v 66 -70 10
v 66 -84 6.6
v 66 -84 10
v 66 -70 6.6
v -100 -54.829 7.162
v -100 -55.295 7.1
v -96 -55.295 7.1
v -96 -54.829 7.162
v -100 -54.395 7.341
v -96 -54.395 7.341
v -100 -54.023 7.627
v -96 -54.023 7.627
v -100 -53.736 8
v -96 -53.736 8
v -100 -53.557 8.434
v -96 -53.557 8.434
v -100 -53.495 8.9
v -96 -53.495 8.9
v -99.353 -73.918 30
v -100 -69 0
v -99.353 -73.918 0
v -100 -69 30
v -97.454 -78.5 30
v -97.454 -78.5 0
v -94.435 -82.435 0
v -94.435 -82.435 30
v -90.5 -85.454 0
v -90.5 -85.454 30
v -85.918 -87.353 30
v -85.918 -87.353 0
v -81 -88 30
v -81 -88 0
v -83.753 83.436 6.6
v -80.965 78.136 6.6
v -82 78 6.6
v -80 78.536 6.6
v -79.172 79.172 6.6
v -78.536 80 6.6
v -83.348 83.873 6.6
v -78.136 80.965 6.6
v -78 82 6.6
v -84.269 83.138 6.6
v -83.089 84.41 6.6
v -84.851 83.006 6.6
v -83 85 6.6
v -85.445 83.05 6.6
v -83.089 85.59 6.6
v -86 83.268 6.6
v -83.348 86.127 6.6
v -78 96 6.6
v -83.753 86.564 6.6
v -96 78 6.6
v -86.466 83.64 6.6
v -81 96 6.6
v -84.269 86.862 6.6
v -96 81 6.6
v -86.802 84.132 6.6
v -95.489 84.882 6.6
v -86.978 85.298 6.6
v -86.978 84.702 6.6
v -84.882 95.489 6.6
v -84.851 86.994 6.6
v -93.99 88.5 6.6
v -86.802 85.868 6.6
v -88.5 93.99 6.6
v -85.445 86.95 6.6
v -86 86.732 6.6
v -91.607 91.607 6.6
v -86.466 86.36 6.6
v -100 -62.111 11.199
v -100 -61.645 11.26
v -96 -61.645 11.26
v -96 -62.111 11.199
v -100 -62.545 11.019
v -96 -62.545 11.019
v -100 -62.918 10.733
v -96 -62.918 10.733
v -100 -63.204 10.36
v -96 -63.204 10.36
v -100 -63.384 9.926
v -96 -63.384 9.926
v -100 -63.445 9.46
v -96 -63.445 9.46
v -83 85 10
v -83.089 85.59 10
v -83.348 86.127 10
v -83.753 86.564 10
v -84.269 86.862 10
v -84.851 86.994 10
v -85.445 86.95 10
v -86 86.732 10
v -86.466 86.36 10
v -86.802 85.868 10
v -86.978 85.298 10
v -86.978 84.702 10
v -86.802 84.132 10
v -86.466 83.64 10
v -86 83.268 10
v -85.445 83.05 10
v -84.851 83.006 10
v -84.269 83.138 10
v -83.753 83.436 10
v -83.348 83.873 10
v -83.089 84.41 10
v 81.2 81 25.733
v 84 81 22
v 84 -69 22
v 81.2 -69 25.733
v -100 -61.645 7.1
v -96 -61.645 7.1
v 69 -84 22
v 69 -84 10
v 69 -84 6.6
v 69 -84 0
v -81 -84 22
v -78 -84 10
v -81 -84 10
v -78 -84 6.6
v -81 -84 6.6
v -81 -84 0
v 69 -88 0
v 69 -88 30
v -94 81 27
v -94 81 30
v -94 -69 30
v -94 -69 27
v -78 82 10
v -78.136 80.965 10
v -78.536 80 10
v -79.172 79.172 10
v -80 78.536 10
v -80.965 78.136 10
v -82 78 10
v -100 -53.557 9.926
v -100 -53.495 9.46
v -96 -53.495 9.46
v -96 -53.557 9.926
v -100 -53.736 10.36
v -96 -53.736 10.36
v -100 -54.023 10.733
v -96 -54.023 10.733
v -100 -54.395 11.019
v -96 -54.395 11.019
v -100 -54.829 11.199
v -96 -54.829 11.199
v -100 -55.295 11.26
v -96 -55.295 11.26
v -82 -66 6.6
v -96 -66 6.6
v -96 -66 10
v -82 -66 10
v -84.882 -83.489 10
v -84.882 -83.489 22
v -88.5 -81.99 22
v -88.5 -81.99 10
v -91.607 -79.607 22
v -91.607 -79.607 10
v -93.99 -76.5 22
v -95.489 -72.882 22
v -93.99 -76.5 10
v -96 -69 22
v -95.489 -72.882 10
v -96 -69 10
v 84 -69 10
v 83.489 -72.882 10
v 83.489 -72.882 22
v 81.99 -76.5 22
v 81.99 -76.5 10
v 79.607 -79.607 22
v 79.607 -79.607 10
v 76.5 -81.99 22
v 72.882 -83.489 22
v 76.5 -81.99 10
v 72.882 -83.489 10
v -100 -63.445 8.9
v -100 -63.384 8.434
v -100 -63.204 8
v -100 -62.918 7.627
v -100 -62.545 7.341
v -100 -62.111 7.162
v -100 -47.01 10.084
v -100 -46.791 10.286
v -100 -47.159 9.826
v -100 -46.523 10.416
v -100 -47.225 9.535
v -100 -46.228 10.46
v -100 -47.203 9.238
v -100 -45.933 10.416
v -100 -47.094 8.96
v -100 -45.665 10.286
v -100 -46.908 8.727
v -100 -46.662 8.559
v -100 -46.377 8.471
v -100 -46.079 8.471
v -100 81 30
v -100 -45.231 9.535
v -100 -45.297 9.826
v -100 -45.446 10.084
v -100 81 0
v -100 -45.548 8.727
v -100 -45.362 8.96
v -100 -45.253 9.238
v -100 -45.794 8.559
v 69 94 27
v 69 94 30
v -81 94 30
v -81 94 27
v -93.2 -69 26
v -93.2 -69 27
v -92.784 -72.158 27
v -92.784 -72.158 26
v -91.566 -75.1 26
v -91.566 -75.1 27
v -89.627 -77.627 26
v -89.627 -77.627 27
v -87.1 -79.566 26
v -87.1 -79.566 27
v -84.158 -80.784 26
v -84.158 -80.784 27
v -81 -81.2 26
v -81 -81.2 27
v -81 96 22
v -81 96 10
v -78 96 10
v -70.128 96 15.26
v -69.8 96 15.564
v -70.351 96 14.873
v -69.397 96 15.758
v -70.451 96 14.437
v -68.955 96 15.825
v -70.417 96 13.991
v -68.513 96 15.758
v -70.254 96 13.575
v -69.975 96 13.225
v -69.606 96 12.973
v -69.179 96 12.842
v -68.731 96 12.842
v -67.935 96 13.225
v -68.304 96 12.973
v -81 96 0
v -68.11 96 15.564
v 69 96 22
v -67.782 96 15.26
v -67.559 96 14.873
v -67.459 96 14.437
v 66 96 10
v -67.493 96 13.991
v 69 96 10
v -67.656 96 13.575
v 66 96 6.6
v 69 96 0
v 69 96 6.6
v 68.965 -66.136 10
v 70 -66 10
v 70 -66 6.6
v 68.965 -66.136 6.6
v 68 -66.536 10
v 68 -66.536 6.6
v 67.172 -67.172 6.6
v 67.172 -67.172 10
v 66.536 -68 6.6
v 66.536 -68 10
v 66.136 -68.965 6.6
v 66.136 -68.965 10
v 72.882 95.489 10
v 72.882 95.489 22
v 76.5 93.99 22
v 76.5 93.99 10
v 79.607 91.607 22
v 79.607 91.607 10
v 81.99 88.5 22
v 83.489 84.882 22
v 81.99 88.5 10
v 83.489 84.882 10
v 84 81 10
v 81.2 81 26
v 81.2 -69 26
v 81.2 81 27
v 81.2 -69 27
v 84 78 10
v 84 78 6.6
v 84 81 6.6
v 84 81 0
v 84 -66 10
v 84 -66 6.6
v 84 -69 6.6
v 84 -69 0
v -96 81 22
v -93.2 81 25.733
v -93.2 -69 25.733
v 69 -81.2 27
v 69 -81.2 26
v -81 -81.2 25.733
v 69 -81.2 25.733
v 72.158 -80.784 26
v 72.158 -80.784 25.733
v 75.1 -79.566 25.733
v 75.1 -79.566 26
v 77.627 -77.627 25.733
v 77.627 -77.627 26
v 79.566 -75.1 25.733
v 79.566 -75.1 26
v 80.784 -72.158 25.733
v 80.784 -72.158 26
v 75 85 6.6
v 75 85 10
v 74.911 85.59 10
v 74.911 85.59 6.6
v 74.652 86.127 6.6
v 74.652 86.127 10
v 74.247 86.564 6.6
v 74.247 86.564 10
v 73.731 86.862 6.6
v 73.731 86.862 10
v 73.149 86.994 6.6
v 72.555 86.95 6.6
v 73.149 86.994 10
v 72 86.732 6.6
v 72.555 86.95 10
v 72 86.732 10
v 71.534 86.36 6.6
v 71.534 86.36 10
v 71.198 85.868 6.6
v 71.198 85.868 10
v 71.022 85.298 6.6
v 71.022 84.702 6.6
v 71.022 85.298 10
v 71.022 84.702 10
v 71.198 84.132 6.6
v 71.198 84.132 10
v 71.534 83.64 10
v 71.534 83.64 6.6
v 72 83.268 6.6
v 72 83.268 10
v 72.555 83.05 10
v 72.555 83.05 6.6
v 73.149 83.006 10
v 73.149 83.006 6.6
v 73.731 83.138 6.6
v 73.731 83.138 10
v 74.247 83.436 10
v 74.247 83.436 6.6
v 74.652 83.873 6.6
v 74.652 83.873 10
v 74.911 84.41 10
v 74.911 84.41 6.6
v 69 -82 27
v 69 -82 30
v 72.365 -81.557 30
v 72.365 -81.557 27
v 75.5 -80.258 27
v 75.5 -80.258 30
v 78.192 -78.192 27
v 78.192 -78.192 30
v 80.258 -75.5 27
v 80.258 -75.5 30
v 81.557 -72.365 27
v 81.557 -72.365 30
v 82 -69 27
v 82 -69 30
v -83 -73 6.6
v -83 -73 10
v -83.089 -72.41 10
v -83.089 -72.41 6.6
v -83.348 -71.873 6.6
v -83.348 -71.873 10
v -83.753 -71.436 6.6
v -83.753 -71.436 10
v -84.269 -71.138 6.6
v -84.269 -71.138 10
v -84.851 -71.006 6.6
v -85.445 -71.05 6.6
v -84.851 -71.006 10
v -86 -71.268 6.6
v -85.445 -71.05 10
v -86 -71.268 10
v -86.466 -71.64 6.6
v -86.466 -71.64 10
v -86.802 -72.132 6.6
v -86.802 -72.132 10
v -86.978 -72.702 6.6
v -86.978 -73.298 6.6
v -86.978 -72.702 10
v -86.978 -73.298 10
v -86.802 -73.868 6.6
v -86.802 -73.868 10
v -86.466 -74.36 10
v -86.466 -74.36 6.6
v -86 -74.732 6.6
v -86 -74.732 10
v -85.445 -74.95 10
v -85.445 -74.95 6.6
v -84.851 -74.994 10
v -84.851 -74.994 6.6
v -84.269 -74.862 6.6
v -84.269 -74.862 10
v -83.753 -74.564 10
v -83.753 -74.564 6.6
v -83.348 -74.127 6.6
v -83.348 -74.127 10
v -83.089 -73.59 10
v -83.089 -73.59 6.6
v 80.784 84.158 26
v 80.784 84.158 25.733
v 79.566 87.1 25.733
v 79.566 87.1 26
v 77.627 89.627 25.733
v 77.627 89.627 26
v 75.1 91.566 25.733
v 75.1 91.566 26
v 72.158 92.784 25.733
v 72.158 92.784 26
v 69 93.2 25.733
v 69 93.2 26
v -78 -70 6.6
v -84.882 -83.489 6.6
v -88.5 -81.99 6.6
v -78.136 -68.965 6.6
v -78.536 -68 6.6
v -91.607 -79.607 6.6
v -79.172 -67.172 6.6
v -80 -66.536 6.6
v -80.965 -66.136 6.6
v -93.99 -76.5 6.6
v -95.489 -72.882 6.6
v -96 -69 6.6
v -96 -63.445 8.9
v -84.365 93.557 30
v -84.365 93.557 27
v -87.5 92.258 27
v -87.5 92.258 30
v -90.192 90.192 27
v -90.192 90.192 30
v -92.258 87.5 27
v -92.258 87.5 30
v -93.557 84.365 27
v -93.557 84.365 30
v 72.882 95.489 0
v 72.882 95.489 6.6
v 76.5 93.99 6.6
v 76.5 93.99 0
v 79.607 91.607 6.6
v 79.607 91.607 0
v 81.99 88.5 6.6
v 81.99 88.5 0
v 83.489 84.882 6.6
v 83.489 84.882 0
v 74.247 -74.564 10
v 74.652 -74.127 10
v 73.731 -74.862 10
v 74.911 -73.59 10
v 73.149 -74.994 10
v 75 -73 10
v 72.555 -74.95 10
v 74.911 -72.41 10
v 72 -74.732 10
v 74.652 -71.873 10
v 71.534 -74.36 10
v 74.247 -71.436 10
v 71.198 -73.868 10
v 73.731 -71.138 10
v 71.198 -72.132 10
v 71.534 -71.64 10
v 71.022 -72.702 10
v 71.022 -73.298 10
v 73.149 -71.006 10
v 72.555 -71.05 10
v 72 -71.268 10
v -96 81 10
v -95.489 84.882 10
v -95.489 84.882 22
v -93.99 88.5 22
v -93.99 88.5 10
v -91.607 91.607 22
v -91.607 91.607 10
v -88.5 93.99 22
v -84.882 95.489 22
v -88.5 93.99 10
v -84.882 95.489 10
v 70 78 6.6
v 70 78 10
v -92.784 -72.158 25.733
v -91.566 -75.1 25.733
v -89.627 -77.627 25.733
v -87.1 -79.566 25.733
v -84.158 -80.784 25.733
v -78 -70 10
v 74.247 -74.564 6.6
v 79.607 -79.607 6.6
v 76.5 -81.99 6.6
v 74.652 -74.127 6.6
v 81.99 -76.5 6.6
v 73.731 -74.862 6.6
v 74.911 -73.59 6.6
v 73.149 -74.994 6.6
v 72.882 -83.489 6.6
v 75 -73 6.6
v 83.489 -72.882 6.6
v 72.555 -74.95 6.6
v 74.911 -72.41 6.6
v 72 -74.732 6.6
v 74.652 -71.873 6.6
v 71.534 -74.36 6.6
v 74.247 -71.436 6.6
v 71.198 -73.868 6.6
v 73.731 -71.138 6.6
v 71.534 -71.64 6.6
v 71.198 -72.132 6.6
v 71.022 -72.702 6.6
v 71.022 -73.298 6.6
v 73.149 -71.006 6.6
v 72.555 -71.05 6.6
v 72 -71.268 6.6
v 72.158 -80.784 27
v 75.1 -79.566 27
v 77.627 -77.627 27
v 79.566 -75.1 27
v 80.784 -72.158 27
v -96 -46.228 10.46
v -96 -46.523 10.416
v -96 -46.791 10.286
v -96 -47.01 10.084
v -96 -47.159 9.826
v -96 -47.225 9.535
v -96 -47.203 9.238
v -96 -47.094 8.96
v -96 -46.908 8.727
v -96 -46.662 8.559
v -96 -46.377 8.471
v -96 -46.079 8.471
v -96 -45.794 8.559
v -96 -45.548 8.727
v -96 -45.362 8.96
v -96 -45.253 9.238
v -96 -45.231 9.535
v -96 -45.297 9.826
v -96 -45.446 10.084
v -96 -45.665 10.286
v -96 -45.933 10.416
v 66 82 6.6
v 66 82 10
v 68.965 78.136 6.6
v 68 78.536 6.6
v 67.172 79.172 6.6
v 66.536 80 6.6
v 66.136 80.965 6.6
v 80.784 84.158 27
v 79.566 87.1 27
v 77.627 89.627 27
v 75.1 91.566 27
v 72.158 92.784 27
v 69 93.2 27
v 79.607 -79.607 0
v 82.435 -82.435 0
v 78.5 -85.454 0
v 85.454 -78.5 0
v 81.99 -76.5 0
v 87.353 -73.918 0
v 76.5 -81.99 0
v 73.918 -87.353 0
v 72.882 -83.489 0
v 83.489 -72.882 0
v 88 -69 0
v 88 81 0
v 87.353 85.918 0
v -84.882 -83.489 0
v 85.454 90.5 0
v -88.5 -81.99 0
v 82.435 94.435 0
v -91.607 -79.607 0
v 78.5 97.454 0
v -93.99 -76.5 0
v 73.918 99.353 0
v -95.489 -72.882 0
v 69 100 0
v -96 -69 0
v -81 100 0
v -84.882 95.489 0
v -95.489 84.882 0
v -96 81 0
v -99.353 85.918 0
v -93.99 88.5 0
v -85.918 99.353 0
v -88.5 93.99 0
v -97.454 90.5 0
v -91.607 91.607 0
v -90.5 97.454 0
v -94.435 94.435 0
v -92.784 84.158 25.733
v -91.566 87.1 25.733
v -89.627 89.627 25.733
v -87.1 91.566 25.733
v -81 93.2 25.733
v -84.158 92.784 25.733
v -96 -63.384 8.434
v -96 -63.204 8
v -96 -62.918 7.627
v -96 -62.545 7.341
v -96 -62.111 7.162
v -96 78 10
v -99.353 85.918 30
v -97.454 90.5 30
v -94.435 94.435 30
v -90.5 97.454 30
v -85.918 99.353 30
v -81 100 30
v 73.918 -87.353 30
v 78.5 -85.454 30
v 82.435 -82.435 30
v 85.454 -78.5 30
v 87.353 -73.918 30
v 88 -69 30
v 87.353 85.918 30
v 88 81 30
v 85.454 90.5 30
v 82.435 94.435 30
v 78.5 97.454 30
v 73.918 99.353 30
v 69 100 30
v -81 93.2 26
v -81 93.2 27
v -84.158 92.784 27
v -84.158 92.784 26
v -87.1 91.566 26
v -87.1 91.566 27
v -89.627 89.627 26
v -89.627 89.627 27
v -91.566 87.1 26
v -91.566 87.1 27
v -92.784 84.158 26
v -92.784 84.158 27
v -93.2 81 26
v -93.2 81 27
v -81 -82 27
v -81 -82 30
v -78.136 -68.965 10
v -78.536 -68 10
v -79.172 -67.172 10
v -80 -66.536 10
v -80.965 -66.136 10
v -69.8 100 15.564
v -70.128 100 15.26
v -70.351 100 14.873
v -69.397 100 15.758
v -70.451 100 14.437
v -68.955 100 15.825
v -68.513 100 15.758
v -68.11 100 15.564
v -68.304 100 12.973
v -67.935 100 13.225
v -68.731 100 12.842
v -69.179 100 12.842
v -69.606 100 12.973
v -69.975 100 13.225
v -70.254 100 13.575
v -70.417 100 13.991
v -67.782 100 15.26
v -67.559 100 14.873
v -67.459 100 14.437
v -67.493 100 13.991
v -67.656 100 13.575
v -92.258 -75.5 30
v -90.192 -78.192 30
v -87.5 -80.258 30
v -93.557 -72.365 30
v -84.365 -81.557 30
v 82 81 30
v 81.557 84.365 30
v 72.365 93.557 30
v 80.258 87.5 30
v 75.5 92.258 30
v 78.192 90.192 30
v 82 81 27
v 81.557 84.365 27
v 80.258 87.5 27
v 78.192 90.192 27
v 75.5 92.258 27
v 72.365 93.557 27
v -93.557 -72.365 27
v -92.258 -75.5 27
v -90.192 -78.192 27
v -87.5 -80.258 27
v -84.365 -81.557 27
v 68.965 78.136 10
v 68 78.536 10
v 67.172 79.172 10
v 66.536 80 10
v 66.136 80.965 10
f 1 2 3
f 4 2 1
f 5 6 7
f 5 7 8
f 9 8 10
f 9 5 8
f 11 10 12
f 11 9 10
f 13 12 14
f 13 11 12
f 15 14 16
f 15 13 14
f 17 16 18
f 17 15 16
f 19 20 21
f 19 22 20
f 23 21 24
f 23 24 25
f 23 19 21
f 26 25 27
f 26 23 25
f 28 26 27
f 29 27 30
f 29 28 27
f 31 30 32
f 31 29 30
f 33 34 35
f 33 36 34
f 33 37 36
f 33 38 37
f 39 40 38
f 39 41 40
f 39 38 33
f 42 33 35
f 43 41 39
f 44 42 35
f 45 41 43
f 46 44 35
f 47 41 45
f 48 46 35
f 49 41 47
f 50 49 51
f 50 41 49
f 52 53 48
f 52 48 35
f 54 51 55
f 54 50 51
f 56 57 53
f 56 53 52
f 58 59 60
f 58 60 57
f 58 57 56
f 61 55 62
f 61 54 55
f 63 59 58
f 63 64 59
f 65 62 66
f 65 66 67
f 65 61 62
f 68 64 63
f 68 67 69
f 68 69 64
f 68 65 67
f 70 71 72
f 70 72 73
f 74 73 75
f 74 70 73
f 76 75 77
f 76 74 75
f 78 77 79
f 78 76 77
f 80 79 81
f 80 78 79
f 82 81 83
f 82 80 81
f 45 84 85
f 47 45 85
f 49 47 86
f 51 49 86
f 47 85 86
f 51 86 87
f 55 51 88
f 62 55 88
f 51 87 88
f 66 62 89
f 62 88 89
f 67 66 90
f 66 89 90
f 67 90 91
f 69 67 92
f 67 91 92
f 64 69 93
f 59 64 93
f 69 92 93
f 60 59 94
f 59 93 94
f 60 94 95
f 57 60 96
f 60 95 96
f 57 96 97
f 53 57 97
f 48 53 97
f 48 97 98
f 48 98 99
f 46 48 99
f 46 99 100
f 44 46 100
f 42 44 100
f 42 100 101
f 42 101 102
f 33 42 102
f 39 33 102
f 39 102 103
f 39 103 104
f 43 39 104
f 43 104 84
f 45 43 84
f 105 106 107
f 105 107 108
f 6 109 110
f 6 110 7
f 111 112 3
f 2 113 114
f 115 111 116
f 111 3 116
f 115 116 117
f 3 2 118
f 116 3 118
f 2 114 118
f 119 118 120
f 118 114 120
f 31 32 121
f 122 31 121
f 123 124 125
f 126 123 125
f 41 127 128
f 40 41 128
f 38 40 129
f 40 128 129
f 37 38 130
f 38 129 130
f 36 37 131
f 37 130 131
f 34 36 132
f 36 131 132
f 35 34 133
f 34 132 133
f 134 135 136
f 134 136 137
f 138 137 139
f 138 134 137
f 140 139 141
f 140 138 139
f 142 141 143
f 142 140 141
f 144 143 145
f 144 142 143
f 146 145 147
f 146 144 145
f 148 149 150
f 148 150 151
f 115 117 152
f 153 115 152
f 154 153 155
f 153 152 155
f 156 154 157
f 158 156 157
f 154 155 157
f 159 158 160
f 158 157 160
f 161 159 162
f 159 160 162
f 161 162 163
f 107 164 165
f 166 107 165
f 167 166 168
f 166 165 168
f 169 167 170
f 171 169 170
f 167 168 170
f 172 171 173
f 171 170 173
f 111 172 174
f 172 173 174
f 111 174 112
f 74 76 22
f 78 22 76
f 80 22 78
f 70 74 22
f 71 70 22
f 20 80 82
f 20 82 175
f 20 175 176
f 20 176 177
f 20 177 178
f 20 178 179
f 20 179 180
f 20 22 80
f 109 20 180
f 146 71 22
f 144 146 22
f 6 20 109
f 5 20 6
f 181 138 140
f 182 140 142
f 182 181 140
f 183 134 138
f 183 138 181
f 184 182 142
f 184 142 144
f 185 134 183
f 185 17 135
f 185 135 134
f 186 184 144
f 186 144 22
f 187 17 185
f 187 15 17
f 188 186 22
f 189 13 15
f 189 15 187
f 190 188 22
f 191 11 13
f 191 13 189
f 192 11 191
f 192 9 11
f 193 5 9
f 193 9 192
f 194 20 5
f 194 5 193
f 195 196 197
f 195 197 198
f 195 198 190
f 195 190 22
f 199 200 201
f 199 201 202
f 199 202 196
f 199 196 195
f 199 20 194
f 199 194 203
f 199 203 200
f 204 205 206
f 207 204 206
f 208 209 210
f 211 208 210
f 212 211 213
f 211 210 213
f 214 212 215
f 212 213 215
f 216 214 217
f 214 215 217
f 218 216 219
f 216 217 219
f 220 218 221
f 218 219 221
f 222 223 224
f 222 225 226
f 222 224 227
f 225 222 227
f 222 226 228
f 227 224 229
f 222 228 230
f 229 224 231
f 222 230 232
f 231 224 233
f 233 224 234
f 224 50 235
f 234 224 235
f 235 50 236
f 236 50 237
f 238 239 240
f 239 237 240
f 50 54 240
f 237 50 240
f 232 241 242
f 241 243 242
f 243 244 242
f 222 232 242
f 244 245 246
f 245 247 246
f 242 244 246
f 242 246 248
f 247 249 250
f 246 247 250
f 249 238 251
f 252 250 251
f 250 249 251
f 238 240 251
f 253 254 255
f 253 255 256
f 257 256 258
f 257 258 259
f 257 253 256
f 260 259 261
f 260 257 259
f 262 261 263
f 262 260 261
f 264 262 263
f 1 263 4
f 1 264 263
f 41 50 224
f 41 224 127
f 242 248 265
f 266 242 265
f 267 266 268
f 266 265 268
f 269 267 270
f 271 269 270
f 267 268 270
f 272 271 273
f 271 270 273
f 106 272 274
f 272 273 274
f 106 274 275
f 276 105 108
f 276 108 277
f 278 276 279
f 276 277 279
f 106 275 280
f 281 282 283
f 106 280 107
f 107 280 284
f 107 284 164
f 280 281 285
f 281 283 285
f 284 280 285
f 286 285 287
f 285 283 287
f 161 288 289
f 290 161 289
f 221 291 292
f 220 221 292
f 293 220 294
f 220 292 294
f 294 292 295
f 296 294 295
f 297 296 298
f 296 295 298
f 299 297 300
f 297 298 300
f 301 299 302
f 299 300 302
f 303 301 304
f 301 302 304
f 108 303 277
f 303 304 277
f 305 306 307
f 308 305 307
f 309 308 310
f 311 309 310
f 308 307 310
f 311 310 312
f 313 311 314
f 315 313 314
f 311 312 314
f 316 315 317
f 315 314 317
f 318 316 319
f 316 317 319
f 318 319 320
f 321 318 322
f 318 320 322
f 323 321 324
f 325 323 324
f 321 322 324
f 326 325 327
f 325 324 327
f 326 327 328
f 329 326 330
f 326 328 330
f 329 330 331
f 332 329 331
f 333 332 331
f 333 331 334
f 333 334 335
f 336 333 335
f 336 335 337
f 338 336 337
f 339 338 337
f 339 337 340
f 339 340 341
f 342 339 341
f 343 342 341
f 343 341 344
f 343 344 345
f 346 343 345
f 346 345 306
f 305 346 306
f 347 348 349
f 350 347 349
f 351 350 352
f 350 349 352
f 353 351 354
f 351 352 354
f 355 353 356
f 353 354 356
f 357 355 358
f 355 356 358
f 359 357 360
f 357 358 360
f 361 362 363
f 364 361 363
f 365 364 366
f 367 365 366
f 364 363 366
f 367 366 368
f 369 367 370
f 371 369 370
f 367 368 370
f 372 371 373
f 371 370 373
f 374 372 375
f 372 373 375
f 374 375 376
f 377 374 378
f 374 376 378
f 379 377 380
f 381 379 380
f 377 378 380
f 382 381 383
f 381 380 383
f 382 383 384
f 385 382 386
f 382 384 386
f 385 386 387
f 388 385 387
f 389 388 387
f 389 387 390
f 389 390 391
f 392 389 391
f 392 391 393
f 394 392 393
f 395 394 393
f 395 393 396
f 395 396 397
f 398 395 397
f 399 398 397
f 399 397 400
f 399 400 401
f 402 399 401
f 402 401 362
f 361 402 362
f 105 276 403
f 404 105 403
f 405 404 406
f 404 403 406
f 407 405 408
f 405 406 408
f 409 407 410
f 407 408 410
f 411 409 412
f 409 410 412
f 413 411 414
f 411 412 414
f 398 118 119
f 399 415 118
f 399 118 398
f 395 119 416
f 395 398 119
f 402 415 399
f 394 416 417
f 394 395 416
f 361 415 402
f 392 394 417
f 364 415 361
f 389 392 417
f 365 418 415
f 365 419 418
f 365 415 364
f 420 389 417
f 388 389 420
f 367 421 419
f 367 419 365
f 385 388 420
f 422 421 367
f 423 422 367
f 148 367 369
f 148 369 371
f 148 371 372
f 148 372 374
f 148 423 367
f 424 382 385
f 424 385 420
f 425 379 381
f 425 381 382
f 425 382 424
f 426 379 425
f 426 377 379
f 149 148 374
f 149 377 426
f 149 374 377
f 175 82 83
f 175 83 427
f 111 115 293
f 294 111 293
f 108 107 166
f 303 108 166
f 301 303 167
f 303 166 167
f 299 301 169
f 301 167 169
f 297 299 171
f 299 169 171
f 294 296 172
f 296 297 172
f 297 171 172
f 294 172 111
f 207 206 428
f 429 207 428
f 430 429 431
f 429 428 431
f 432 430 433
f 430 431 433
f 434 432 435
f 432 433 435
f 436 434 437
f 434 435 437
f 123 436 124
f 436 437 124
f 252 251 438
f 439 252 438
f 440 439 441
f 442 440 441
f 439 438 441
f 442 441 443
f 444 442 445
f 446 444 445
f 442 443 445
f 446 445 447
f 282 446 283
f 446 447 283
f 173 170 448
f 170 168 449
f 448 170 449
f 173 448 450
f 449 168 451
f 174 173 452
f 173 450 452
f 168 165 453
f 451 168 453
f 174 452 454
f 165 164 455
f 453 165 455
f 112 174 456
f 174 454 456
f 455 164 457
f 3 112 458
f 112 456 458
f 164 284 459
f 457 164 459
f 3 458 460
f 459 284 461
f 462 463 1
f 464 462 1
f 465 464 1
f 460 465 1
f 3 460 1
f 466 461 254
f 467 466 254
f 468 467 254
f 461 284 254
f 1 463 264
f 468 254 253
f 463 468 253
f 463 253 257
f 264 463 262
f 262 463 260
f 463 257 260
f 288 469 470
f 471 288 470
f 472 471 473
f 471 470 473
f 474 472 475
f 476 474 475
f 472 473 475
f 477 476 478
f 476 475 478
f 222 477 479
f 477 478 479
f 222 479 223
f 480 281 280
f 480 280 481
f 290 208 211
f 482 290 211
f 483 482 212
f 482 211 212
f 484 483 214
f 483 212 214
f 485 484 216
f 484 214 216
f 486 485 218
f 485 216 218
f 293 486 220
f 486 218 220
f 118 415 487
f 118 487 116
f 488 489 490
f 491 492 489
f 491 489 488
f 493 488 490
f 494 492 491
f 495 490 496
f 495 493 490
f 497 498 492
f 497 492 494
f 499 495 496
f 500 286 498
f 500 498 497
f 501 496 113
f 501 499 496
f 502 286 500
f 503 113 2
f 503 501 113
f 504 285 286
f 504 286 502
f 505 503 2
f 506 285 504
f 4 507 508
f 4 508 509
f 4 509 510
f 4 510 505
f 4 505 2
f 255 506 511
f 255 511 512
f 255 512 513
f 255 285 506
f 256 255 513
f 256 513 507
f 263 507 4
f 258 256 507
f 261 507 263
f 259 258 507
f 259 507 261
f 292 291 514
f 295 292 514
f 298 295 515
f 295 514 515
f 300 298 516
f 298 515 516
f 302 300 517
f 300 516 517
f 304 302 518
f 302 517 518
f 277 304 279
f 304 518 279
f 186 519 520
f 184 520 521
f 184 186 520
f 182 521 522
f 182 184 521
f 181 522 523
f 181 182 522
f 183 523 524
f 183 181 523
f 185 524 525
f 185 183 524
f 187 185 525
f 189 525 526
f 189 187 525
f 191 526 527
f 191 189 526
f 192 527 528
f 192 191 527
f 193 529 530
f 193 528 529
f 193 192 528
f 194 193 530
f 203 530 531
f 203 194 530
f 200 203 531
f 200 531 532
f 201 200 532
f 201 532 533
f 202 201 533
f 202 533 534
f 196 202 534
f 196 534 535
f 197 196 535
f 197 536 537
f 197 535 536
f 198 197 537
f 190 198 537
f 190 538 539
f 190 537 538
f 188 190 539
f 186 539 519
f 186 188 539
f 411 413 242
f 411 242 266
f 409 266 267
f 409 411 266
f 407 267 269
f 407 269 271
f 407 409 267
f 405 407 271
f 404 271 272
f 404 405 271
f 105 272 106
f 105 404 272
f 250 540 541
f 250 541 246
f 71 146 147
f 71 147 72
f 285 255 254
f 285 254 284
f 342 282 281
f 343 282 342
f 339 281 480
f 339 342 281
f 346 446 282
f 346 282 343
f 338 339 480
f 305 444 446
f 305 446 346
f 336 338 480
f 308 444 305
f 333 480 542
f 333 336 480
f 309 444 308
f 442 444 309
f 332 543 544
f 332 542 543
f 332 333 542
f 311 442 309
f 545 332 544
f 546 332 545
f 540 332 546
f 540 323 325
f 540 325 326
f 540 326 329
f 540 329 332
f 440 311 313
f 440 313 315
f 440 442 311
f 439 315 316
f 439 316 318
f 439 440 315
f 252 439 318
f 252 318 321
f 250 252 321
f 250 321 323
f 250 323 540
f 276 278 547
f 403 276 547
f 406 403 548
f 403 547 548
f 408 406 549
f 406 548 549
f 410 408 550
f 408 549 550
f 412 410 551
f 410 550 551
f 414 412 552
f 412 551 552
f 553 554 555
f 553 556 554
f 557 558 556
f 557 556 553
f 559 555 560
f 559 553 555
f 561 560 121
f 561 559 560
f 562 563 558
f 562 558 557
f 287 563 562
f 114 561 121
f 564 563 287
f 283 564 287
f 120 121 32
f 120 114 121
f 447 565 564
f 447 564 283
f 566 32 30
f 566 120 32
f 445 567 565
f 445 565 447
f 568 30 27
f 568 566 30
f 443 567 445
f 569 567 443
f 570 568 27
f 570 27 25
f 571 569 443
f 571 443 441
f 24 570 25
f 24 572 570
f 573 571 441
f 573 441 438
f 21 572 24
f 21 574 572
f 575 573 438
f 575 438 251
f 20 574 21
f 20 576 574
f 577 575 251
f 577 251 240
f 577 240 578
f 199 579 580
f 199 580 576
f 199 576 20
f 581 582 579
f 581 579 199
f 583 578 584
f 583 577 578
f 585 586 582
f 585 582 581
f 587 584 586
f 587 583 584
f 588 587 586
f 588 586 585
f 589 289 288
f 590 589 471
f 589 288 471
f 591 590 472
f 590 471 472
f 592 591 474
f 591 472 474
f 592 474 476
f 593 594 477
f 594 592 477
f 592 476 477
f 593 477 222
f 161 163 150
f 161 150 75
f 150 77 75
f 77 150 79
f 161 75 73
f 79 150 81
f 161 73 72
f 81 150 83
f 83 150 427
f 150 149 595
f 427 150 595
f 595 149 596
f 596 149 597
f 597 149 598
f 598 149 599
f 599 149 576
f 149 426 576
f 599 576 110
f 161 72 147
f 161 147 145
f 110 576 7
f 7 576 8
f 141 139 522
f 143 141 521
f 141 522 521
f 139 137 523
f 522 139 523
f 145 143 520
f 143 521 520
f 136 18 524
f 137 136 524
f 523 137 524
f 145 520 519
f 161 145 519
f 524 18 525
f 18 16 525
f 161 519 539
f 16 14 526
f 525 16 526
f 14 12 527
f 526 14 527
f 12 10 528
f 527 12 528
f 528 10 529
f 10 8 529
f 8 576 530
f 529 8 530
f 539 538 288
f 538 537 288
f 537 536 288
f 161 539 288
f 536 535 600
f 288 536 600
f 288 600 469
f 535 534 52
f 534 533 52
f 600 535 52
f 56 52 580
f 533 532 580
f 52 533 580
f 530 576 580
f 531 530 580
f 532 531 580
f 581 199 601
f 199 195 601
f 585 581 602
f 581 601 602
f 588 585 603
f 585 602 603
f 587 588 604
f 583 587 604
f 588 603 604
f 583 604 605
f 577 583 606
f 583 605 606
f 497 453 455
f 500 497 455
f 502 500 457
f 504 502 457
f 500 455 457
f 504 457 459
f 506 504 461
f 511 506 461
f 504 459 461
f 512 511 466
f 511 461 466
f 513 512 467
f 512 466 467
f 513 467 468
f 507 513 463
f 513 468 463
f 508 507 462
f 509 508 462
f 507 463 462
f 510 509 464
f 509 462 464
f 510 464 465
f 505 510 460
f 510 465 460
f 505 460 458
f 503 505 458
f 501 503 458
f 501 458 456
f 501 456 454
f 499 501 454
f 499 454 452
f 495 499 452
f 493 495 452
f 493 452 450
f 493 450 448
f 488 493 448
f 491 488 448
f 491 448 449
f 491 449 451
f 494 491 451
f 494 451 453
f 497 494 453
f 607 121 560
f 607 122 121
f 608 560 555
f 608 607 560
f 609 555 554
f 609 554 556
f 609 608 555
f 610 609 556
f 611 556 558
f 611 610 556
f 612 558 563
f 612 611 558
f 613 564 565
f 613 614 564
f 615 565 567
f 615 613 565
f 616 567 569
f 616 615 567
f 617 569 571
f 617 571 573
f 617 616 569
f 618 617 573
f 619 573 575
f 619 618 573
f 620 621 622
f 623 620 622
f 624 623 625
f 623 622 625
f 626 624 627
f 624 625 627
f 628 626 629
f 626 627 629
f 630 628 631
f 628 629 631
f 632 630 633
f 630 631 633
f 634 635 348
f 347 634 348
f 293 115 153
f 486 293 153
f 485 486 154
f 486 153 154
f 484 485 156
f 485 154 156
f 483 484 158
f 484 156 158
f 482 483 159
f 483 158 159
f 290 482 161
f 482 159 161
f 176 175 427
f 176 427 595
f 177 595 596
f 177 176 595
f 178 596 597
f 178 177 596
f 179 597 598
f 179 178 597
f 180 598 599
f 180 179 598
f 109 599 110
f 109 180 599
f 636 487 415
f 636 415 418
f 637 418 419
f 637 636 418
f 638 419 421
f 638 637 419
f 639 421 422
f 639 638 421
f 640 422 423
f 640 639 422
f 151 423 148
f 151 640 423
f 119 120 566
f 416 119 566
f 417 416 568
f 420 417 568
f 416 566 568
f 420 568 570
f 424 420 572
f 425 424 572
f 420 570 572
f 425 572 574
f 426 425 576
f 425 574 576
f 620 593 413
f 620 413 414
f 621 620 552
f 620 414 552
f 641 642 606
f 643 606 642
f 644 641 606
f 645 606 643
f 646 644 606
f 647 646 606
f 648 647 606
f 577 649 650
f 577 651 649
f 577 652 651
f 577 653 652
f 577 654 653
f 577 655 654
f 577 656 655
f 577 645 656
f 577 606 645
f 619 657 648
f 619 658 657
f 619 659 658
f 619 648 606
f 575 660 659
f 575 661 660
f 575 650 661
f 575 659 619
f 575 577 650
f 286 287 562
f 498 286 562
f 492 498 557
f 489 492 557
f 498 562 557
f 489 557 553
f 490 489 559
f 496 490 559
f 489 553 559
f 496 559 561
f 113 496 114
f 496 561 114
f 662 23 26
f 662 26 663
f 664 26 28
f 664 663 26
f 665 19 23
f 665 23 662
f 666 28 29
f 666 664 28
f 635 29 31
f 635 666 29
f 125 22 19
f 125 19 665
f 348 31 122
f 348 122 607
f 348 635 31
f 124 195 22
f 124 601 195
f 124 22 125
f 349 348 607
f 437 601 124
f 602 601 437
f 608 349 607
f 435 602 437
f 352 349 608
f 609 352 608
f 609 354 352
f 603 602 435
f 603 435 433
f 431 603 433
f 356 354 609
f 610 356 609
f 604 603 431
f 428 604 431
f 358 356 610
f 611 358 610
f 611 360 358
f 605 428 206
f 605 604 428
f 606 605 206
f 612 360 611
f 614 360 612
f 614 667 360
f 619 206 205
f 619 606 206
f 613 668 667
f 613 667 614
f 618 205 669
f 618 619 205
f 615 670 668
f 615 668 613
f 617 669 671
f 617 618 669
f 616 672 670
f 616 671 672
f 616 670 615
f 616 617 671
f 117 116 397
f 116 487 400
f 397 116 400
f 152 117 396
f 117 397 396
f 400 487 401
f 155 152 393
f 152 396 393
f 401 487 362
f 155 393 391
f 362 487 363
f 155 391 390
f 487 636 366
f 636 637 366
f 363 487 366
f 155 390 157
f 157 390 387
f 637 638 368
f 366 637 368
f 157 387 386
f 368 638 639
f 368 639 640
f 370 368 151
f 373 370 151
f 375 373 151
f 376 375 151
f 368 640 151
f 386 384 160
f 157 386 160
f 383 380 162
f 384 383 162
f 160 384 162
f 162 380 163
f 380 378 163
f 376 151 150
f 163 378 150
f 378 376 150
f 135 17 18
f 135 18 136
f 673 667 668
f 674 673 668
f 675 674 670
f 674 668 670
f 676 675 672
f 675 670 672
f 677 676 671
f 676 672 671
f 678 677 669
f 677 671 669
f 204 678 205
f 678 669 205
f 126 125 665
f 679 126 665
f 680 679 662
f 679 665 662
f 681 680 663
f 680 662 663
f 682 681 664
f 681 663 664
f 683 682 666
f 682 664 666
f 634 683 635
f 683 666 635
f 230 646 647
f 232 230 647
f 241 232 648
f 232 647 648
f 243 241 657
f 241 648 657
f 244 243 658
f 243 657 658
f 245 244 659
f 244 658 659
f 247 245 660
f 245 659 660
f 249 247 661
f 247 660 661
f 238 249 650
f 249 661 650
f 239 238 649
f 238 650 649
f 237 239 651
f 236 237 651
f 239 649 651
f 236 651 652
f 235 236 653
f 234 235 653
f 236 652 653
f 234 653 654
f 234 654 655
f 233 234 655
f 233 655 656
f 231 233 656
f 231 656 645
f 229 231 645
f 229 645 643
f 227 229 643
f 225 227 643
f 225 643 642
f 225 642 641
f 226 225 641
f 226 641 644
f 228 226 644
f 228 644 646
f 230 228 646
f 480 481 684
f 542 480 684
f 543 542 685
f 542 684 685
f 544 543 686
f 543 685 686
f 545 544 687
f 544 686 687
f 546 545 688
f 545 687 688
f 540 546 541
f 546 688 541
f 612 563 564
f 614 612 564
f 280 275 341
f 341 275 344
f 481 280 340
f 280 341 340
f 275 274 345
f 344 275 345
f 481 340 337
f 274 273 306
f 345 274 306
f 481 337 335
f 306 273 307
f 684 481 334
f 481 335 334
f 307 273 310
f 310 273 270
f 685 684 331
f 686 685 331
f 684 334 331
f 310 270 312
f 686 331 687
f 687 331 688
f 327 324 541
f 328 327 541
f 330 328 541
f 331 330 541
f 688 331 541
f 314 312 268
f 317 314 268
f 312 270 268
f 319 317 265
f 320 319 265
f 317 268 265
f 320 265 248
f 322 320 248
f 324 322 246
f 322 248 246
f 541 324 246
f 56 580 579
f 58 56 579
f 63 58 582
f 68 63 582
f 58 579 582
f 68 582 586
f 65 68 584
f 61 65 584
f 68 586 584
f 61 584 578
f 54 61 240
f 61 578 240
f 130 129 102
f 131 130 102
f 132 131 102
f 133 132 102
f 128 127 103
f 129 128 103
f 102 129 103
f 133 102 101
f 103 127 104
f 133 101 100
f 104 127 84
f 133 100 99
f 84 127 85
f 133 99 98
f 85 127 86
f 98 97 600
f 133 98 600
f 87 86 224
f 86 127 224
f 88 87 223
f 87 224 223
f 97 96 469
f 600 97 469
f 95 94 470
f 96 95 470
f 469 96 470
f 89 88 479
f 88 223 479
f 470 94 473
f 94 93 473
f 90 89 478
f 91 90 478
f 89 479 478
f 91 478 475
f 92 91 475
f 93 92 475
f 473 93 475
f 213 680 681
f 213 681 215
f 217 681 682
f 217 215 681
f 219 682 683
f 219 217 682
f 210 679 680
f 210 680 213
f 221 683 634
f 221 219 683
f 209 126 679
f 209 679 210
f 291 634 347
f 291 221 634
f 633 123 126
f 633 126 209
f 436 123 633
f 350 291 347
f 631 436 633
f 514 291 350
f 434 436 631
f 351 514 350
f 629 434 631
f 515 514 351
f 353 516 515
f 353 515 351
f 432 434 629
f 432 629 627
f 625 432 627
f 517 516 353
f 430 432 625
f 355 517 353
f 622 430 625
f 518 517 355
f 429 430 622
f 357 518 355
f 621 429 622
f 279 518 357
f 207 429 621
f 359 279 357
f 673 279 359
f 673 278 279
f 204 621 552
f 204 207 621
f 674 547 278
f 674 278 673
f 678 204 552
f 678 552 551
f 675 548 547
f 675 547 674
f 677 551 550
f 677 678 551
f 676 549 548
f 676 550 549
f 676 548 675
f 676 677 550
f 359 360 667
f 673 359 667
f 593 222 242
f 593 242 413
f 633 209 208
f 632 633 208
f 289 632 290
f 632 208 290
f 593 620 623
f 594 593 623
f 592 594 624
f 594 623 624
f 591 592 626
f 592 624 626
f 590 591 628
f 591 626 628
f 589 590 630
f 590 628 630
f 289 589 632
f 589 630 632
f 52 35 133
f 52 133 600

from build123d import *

# Parameters (mm, degrees)
SKETCH2_W                                 = 188
SKETCH2_H                                 = 188
BOSS_EXTRUDE1_DEPTH                       = 30
FILLET1_R                                 = 19
CUT_EXTRUDE6_DEPTH                        = 4
CUT_EXTRUDE8_SVUOTAMENTO_DEPTH            = 26
CUT_EXTRUDE9_ALLOGGIAMENTO_FINESTRA_DEPTH = 3
BOSS_EXTRUDE2_DEPTH                       = 10
FILLET4_R                                 = 4
F_4_0MM_DOWEL_HOLE2_D                     = 4
CUT_EXTRUDE10_DEPTH                       = 6.6
CUT_EXTRUDE4_REACH                        = 217.044
SKETCH11_R                                = 1.5
CUT_EXTRUDE5_REACH                        = 217.044
SKETCH15_R                                = 1
CHAMFER1_SIZE                             = 4
CHAMFER1_SIZE_2                           = 3


with BuildPart() as part:
    # Sketch2 → Boss-Extrude1 (new body)
    with BuildSketch(Plane.XY):
        with Locations((-6, 6)):
            Rectangle(SKETCH2_W, SKETCH2_H)
    extrude(amount=BOSS_EXTRUDE1_DEPTH)

    # Fillet1
    fillet1_edges = [part.edges().sort_by_distance(p)[0] for p in [
        (88, -88, 15),
        (-100, -88, 15),
        (-100, 100, 15),
        (88, 100, 15),
    ]]
    fillet(fillet1_edges, radius=FILLET1_R)

    # Sketch18 → Cut-Extrude6 (cut)
    with BuildSketch(Plane.XY.offset(30)):
        with BuildLine():
            Line((-93.2, 81), (-93.2, -69))
            ThreePointArc((-93.2, -69), (-89.62670273, -77.62670273), (-81, -81.2))
            Line((-81, -81.2), (69, -81.2))
            ThreePointArc((69, -81.2), (77.62670273, -77.62670273), (81.2, -69))
            Line((81.2, -69), (81.2, 81))
            ThreePointArc((81.2, 81), (77.62670273, 89.62670273), (69, 93.2))
            Line((69, 93.2), (-81, 93.2))
            ThreePointArc((-81, 93.2), (-89.62670273, 89.62670273), (-93.2, 81))
        make_face()
    extrude(amount=-CUT_EXTRUDE6_DEPTH, mode=Mode.SUBTRACT)

    # Sketch19 → Cut-Extrude8-svuotamento (cut)
    with BuildSketch(Plane(origin=(0, 0, 0), x_dir=(-1, 0, 0), z_dir=(0, 0, -1))):
        with BuildLine():
            Line((-69, -84), (81, -84))
            ThreePointArc((81, -84), (91.606601718, -79.606601718), (96, -69))
            Line((96, -69), (96, 81))
            ThreePointArc((96, 81), (91.606601718, 91.606601718), (81, 96))
            Line((81, 96), (-69, 96))
            ThreePointArc((-69, 96), (-79.606601718, 91.606601718), (-84, 81))
            Line((-84, 81), (-84, -69))
            ThreePointArc((-84, -69), (-79.606601718, -79.606601718), (-69, -84))
        make_face()
    extrude(amount=-CUT_EXTRUDE8_SVUOTAMENTO_DEPTH, mode=Mode.SUBTRACT)

    # Sketch20 → Cut-Extrude9-alloggiamento-finestra (cut)
    with BuildSketch(Plane.XY.offset(30)):
        with BuildLine():
            Line((-94, 81), (-94, -69))
            ThreePointArc((-94, -69), (-90.192388155, -78.192388155), (-81, -82))
            Line((-81, -82), (69, -82))
            ThreePointArc((69, -82), (78.192388155, -78.192388155), (82, -69))
            Line((82, -69), (82, 81))
            ThreePointArc((82, 81), (78.192388155, 90.192388155), (69, 94))
            Line((69, 94), (-81, 94))
            ThreePointArc((-81, 94), (-90.192388155, 90.192388155), (-94, 81))
        make_face()
    extrude(amount=-CUT_EXTRUDE9_ALLOGGIAMENTO_FINESTRA_DEPTH, mode=Mode.SUBTRACT)

    # Sketch22 → Boss-Extrude2 (add)
    with BuildSketch(Plane(origin=(0, 0, 0), x_dir=(-1, 0, 0), z_dir=(0, 0, -1))):
        with BuildLine():
            Line((-84, 78), (-66, 78))
            Line((-66, 78), (-66, 96))
            Line((-66, 96), (-69, 96))
            ThreePointArc((-69, 96), (-79.606601718, 91.606601718), (-84, 81))
            Line((-84, 81), (-84, 78))
        make_face()
        with BuildLine():
            Line((81, 96), (78, 96))
            Line((78, 96), (78, 78))
            Line((78, 78), (96, 78))
            Line((96, 78), (96, 81))
            ThreePointArc((96, 81), (91.606601718, 91.606601718), (81, 96))
        make_face()
        with BuildLine():
            Line((78, -66), (78, -84))
            Line((78, -84), (81, -84))
            ThreePointArc((81, -84), (91.606601718, -79.606601718), (96, -69))
            Line((96, -69), (96, -66))
            Line((96, -66), (78, -66))
        make_face()
        with BuildLine():
            Line((-66, -66), (-84, -66))
            Line((-84, -66), (-84, -69))
            ThreePointArc((-84, -69), (-79.606601718, -79.606601718), (-69, -84))
            Line((-69, -84), (-66, -84))
            Line((-66, -84), (-66, -66))
        make_face()
    extrude(amount=-BOSS_EXTRUDE2_DEPTH)

    # Fillet4
    fillet4_edges = [part.edges().sort_by_distance(p)[0] for p in [
        (66, 78, 5),
        (-78, 78, 5),
        (-78, -66, 5),
        (66, -66, 5),
    ]]
    fillet(fillet4_edges, radius=FILLET4_R)

    # Ø4.0mm Dowel Hole2 (through all)
    with Locations(Plane(origin=(0, 0, 0), x_dir=(-1, 0, 0), z_dir=(0, 0, -1))):
        with Locations((-73, 85), (85, 85), (85, -73), (-73, -73)):
            Hole(F_4_0MM_DOWEL_HOLE2_D / 2)

    # Sketch30 → Cut-Extrude10 (cut)
    with BuildSketch(Plane(origin=(0, 0, 0), x_dir=(-1, 0, 0), z_dir=(0, 0, -1))):
        with BuildLine():
            Line((-69, -84), (81, -84))
            ThreePointArc((81, -84), (91.606601718, -79.606601718), (96, -69))
            Line((96, -69), (96, 81))
            ThreePointArc((96, 81), (91.606601718, 91.606601718), (81, 96))
            Line((81, 96), (-69, 96))
            ThreePointArc((-69, 96), (-79.606601718, 91.606601718), (-84, 81))
            Line((-84, 81), (-84, -69))
            ThreePointArc((-84, -69), (-79.606601718, -79.606601718), (-69, -84))
        make_face()
    extrude(amount=-CUT_EXTRUDE10_DEPTH, mode=Mode.SUBTRACT)

    # Sketch11 → Cut-Extrude4 (cut, up to next)
    with BuildSketch(Plane(origin=(0, 100, 0), x_dir=(1, 0, 0), z_dir=(0, 1, 0)), mode=Mode.PRIVATE) as cut_extrude4_sk1:
        with Locations(Location((-68.95500318, -14.324851484, 0), (0, 0, 270))):
            Circle(SKETCH11_R)
    cut_extrude4_tool1 = extrude(cut_extrude4_sk1.sketch, amount=-CUT_EXTRUDE4_REACH, mode=Mode.PRIVATE) & part.part
    add(cut_extrude4_tool1.solids().sort_by_distance((-68.955003, 100, 14.324851))[0], mode=Mode.SUBTRACT)

    # Sketch15 → Cut-Extrude5 (cut, up to next)
    with BuildSketch(Plane(origin=(-100, 0, 0), x_dir=(0, 0, -1), z_dir=(1, 0, 0)), mode=Mode.PRIVATE) as cut_extrude5_sk1:
        with Locations(Location((-9.460245724, -46.22788492, 0), (0, 0, 180))):
            Circle(SKETCH15_R)
    cut_extrude5_tool1 = extrude(cut_extrude5_sk1.sketch, amount=CUT_EXTRUDE5_REACH, mode=Mode.PRIVATE) & part.part
    # Sketch15 → Cut-Extrude5 (cut, up to next)
    with BuildSketch(Plane(origin=(-100, 0, 0), x_dir=(0, 0, -1), z_dir=(1, 0, 0)), mode=Mode.PRIVATE) as cut_extrude5_sk2:
        with BuildLine():
            Line((-8.900245724, -53.495303579), (-9.460245724, -53.495303579))
            ThreePointArc((-9.460245724, -53.495303579), (-10.73303793, -54.022511373), (-11.260245724, -55.295303579))
            Line((-11.260245724, -55.295303579), (-11.260245724, -61.645303576))
            ThreePointArc((-11.260245724, -61.645303576), (-10.73303793, -62.918095782), (-9.460245724, -63.445303576))
            Line((-9.460245724, -63.445303576), (-8.900245724, -63.445303576))
            ThreePointArc((-8.900245724, -63.445303576), (-7.627453518, -62.918095782), (-7.100245724, -61.645303576))
            Line((-7.100245724, -61.645303576), (-7.100245724, -55.295303579))
            ThreePointArc((-7.100245724, -55.295303579), (-7.627453518, -54.022511373), (-8.900245724, -53.495303579))
        make_face()
    cut_extrude5_tool2 = extrude(cut_extrude5_sk2.sketch, amount=CUT_EXTRUDE5_REACH, mode=Mode.PRIVATE) & part.part
    add(cut_extrude5_tool1.solids().sort_by_distance((-100, -46.227885, 9.460246))[0], mode=Mode.SUBTRACT)
    add(cut_extrude5_tool2.solids().sort_by_distance((-100, -58.470304, 9.180246))[0], mode=Mode.SUBTRACT)

    # Chamfer1
    # the kernel refuses this chamfer: 4, 3 mm, written as the material it adds along each edge
    with BuildSketch(Plane(origin=(69, -84, 26), x_dir=(0, -0.023249527748764737, -0.9997296931968459), z_dir=(-1, 0, 0))) as chamfer1_piece_1_section:
        Polygon((CHAMFER1_SIZE * 0.999729693197, -CHAMFER1_SIZE * 0.0232495277488), (-CHAMFER1_SIZE_2 * 0.0232495277488, -CHAMFER1_SIZE_2 * 0.999729693197), (0, 0), align=None)
    chamfer1_piece_1 = extrude(amount=150, mode=Mode.PRIVATE)
    chamfer1_piece_1 = split(chamfer1_piece_1, bisect_by=Plane(origin=(-6, -81.2, 24.654371932), z_dir=(0, -1, 0)), keep=Keep.TOP, mode=Mode.PRIVATE)
    add(chamfer1_piece_1)
    with BuildSketch(Plane(origin=(-81, -69, 26), x_dir=(0, -1, 0), z_dir=(1, 0, 0))) as chamfer1_piece_2_section:
        Polygon((15 - CHAMFER1_SIZE_2, 0), (15, CHAMFER1_SIZE), (15, 0), align=None)
    chamfer1_piece_2 = revolve(axis=Axis((-81, -69, 26), (0, 0, -1)), revolution_arc=90, mode=Mode.PRIVATE)
    chamfer1_piece_2 = chamfer1_piece_2 - Plane(origin=(-81, -69, 24.826857266), x_dir=(-1, 0, 0), z_dir=(0, 0, 1)) * Cylinder(12.2, 60, mode=Mode.PRIVATE)
    add(chamfer1_piece_2)
    with BuildSketch(Plane(origin=(69, -69, 26), x_dir=(1, 0, 0), z_dir=(0, 1, 0))) as chamfer1_piece_3_section:
        Polygon((15 - CHAMFER1_SIZE_2, 0), (15, CHAMFER1_SIZE), (15, 0), align=None)
    chamfer1_piece_3 = revolve(axis=Axis((69, -69, 26), (0, 0, -1)), revolution_arc=90, mode=Mode.PRIVATE)
    chamfer1_piece_3 = chamfer1_piece_3 - Plane(origin=(69, -69, 24.826857266), x_dir=(0, -1, 0), z_dir=(0, 0, 1)) * Cylinder(12.2, 60, mode=Mode.PRIVATE)
    add(chamfer1_piece_3)
    with BuildSketch(Plane(origin=(-96, -69, 26), x_dir=(-0.023249527748764737, 0, -0.9997296931968459), z_dir=(0, 1, 0))) as chamfer1_piece_4_section:
        Polygon((CHAMFER1_SIZE * 0.999729693197, -CHAMFER1_SIZE * 0.0232495277488), (-CHAMFER1_SIZE_2 * 0.0232495277488, -CHAMFER1_SIZE_2 * 0.999729693197), (0, 0), align=None)
    chamfer1_piece_4 = extrude(amount=150, mode=Mode.PRIVATE)
    chamfer1_piece_4 = split(chamfer1_piece_4, bisect_by=Plane(origin=(-93.2, 6, 24.654371932), z_dir=(-1, 0, 0)), keep=Keep.TOP, mode=Mode.PRIVATE)
    add(chamfer1_piece_4)
    with BuildSketch(Plane(origin=(84, 81, 26), x_dir=(0.023249527748764737, 0, -0.9997296931968459), z_dir=(0, -1, 0))) as chamfer1_piece_5_section:
        Polygon((CHAMFER1_SIZE * 0.999729693197, -CHAMFER1_SIZE * 0.0232495277488), (-CHAMFER1_SIZE_2 * 0.0232495277488, -CHAMFER1_SIZE_2 * 0.999729693197), (0, 0), align=None)
    chamfer1_piece_5 = extrude(amount=150, mode=Mode.PRIVATE)
    chamfer1_piece_5 = split(chamfer1_piece_5, bisect_by=Plane(origin=(81.2, 6, 24.654371932), z_dir=(1, 0, 0)), keep=Keep.TOP, mode=Mode.PRIVATE)
    add(chamfer1_piece_5)
    with BuildSketch(Plane(origin=(-81, 81, 26), x_dir=(-1, 0, 0), z_dir=(0, -1, 0))) as chamfer1_piece_6_section:
        Polygon((15 - CHAMFER1_SIZE_2, 0), (15, CHAMFER1_SIZE), (15, 0), align=None)
    chamfer1_piece_6 = revolve(axis=Axis((-81, 81, 26), (0, 0, -1)), revolution_arc=90, mode=Mode.PRIVATE)
    chamfer1_piece_6 = chamfer1_piece_6 - Plane(origin=(-81, 81, 24.826857266), x_dir=(0, 1, 0), z_dir=(0, 0, 1)) * Cylinder(12.2, 61, mode=Mode.PRIVATE)
    add(chamfer1_piece_6)
    with BuildSketch(Plane(origin=(69, 81, 26), x_dir=(0, 1, 0), z_dir=(-1, 0, 0))) as chamfer1_piece_7_section:
        Polygon((15, CHAMFER1_SIZE), (15 - CHAMFER1_SIZE_2, 0), (15, 0), align=None)
    chamfer1_piece_7 = revolve(axis=Axis((69, 81, 26), (0, 0, -1)), revolution_arc=90, mode=Mode.PRIVATE)
    chamfer1_piece_7 = chamfer1_piece_7 - Plane(origin=(69, 81, 24.516674107), x_dir=(1, 0, 0), z_dir=(0, 0, 1)) * Cylinder(12.2, 61, mode=Mode.PRIVATE)
    add(chamfer1_piece_7)
    with BuildSketch(Plane(origin=(-81, 96, 26), x_dir=(0, 0.023249527748764737, -0.9997296931968459), z_dir=(1, 0, 0))) as chamfer1_piece_8_section:
        Polygon((CHAMFER1_SIZE * 0.999729693197, -CHAMFER1_SIZE * 0.0232495277488), (-CHAMFER1_SIZE_2 * 0.0232495277488, -CHAMFER1_SIZE_2 * 0.999729693197), (0, 0), align=None)
    chamfer1_piece_8 = extrude(amount=150, mode=Mode.PRIVATE)
    chamfer1_piece_8 = split(chamfer1_piece_8, bisect_by=Plane(origin=(-6, 93.2, 24.654371932), z_dir=(0, 1, 0)), keep=Keep.TOP, mode=Mode.PRIVATE)
    add(chamfer1_piece_8)


solid = part.part
